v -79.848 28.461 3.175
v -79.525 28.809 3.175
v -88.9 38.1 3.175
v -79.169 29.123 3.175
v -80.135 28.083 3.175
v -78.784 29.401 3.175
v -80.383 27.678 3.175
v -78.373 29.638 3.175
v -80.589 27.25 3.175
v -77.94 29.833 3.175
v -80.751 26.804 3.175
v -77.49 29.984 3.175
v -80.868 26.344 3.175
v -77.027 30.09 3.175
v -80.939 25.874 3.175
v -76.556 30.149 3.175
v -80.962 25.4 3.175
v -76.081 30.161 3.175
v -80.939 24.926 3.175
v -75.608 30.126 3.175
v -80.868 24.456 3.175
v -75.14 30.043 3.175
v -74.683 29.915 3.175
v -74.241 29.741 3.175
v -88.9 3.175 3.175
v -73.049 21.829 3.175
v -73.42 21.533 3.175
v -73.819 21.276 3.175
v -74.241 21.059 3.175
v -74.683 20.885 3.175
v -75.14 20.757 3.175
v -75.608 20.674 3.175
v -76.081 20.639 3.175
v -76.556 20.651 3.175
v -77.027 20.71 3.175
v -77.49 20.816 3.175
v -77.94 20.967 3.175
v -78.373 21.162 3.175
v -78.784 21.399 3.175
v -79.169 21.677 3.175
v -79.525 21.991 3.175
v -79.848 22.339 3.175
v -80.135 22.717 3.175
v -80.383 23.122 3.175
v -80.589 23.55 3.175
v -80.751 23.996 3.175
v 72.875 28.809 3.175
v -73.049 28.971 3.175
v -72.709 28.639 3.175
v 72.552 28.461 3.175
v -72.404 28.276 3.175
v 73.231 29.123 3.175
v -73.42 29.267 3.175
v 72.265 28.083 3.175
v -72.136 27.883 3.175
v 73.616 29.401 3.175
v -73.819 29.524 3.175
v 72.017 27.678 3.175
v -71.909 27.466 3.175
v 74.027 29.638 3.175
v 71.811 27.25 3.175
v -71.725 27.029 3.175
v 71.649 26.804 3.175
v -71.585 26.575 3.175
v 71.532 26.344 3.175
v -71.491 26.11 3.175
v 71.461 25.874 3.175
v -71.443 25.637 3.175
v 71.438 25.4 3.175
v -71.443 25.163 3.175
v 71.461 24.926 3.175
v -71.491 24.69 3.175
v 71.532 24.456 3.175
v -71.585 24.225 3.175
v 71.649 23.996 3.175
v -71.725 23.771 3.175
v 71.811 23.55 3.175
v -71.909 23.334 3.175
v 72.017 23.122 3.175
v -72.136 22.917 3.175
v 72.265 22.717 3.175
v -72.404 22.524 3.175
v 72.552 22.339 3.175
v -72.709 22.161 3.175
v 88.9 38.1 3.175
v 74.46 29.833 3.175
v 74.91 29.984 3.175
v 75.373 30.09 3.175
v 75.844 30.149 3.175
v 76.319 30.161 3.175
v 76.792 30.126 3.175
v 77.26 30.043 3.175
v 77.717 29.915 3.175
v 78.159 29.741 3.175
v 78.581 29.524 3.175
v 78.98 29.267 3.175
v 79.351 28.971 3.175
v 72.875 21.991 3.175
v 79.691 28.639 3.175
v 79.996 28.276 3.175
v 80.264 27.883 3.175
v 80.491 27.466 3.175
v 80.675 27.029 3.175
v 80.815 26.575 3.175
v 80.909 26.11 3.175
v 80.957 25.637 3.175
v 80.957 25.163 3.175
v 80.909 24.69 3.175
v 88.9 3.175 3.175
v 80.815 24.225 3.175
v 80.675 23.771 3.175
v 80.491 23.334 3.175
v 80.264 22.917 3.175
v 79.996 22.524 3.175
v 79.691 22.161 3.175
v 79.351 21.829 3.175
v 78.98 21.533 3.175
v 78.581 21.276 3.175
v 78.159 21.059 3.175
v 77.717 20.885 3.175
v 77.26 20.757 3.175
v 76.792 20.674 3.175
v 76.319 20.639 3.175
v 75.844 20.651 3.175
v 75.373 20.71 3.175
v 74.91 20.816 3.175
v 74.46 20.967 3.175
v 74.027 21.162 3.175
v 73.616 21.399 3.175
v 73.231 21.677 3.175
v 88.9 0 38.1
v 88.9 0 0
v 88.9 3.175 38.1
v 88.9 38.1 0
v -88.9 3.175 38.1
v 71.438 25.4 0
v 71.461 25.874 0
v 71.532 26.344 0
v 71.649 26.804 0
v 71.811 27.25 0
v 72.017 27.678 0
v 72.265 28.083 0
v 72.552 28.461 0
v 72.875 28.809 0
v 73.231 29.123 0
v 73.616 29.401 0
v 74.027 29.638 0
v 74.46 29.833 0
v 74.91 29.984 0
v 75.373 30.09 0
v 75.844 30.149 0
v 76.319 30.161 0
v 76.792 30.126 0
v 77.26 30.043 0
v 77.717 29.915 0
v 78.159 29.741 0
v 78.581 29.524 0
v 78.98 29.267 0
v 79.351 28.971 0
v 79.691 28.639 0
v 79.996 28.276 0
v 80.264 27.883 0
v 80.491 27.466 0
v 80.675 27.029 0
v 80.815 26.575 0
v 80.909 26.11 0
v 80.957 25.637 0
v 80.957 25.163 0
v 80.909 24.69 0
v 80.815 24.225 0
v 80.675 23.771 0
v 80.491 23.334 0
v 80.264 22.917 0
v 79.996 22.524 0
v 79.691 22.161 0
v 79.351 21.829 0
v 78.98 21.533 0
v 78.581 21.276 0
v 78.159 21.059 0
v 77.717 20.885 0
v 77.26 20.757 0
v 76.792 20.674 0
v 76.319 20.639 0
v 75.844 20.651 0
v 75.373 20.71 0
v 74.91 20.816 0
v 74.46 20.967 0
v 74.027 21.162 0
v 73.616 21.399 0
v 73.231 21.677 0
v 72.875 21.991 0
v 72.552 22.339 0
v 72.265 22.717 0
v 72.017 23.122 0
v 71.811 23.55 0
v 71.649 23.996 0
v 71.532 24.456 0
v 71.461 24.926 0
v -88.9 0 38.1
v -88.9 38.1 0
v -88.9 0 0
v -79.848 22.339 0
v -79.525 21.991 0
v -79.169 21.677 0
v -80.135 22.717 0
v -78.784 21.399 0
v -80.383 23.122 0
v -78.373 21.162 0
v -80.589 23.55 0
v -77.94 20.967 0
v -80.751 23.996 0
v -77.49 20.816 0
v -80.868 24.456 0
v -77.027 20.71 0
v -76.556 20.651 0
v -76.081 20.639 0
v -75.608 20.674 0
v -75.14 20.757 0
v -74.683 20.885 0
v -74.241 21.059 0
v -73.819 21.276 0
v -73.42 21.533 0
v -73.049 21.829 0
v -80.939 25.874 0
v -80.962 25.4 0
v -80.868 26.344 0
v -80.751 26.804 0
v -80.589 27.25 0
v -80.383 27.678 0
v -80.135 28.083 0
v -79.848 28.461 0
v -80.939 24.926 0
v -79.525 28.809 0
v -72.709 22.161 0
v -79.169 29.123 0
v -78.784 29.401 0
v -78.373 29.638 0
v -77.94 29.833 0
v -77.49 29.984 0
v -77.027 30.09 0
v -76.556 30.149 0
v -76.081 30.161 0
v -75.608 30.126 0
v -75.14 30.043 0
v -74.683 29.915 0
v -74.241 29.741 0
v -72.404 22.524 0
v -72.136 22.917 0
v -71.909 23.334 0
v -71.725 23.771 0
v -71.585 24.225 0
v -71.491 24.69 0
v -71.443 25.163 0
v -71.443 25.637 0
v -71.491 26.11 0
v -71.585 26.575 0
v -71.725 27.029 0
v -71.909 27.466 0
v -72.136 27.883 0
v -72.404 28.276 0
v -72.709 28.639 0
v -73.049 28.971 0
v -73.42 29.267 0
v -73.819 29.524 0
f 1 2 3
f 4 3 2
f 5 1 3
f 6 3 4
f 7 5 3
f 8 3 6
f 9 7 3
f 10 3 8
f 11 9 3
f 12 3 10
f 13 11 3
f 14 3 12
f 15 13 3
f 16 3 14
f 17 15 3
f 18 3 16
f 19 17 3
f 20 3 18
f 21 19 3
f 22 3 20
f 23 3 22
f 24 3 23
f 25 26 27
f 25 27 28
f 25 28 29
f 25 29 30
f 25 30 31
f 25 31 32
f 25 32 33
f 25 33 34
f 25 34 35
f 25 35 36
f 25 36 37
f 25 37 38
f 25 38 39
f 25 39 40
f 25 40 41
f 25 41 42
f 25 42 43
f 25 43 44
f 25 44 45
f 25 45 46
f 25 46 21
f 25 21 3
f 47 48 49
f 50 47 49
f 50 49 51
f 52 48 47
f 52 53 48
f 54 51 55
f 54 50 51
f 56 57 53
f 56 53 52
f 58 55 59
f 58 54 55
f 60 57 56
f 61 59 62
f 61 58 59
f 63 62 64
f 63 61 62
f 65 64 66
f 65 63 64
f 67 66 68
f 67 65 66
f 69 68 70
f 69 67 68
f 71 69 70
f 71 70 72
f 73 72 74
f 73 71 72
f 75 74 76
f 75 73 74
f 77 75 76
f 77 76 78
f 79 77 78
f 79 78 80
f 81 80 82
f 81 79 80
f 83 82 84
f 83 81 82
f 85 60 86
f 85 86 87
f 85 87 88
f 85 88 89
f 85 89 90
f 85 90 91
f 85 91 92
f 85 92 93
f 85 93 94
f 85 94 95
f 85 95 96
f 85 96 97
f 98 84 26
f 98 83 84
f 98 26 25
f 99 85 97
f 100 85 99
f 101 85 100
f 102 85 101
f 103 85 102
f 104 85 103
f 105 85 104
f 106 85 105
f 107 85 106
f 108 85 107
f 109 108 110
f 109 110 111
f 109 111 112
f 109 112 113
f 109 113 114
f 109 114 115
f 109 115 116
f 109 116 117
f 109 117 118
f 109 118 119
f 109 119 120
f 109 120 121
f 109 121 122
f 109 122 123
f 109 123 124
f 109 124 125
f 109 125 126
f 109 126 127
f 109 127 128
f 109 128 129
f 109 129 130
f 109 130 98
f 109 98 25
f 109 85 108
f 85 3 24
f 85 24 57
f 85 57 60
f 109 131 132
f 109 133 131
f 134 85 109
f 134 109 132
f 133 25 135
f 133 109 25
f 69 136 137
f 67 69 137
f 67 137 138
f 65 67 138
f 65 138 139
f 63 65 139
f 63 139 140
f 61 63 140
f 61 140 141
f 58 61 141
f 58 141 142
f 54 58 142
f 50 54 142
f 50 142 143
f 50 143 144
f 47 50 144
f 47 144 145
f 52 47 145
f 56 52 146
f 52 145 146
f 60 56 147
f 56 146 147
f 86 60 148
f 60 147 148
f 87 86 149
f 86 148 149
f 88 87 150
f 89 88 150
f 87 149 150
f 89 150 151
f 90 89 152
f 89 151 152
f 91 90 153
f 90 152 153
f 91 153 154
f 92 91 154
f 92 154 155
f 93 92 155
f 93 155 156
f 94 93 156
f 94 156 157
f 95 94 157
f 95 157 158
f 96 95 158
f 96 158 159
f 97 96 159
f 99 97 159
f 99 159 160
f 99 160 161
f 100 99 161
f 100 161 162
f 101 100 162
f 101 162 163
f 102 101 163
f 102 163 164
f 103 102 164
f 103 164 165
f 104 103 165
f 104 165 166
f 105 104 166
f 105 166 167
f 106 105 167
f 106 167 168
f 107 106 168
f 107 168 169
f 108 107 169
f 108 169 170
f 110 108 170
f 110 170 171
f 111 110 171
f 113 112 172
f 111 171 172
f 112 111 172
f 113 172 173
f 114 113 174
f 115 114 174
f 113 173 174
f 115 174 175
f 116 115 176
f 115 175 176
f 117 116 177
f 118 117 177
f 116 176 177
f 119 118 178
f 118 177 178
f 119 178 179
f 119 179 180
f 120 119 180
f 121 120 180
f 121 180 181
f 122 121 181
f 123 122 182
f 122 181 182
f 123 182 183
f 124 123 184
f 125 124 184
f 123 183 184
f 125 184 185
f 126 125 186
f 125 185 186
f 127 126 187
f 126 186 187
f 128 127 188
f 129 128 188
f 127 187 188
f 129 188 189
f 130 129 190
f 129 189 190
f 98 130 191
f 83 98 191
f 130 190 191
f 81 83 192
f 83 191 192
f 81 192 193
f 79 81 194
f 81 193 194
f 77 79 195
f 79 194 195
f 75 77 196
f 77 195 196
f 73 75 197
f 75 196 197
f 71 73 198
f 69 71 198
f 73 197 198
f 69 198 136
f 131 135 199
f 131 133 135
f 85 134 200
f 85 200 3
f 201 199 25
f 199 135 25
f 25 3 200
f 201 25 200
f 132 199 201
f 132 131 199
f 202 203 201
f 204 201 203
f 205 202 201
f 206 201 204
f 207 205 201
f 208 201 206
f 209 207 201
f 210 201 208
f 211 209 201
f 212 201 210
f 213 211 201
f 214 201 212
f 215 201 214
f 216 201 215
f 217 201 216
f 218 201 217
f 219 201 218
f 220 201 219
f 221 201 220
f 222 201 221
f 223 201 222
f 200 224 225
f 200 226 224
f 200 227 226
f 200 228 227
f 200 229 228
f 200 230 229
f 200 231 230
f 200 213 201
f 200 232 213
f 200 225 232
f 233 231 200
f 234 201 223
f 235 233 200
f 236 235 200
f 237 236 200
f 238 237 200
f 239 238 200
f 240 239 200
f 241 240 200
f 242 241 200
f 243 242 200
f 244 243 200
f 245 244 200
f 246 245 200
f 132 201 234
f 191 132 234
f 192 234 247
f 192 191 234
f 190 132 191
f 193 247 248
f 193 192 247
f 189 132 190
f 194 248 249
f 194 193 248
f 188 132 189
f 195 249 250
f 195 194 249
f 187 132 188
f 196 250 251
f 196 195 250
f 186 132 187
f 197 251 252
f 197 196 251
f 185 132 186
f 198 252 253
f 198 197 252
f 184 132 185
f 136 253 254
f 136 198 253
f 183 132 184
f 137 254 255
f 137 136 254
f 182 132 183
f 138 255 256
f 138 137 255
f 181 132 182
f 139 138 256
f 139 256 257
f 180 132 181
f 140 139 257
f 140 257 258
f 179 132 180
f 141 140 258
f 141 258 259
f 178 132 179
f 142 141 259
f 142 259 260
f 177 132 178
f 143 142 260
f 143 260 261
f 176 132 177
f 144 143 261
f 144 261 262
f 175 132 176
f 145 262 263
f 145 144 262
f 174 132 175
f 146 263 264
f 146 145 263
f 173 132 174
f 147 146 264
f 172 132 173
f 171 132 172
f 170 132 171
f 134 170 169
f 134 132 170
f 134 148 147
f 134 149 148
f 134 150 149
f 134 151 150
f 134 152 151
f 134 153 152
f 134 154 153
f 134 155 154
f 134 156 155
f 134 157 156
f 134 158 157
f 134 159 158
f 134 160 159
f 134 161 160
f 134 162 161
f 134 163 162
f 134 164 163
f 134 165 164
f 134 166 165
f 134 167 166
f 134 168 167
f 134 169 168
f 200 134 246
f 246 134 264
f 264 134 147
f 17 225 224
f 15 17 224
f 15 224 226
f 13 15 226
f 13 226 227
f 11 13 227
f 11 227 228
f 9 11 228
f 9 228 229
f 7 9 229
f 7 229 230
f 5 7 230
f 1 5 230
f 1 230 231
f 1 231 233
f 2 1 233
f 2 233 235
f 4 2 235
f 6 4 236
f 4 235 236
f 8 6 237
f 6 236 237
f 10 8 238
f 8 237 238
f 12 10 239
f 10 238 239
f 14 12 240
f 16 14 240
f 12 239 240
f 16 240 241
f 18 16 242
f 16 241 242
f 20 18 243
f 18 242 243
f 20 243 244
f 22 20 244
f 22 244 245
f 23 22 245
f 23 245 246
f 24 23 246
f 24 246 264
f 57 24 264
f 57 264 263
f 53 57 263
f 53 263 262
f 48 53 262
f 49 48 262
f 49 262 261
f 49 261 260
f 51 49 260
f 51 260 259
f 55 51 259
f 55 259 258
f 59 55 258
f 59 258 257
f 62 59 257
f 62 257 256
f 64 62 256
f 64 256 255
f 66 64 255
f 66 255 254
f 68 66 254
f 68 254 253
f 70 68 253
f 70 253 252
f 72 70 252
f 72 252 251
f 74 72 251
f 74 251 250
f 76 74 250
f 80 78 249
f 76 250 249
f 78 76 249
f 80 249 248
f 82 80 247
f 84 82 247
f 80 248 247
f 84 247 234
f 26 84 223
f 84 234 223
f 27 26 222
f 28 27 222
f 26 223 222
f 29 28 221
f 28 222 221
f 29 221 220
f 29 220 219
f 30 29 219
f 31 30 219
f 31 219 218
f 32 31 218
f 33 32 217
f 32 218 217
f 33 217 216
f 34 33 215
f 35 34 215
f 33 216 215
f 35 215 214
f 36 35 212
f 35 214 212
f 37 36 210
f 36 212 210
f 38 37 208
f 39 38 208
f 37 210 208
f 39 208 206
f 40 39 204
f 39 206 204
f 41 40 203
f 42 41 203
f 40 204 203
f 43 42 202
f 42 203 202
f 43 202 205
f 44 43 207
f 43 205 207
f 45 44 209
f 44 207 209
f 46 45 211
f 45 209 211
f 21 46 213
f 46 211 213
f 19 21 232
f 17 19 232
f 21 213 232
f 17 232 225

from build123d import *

# Parameters (mm, degrees)
EXTRUDE_THIN1_DEPTH = 88.9
CUT_EXTRUDE1_REACH  = 105.954
SKETCH2_R           = 4.7625


with BuildPart() as part:
    # Sketch1 → Extrude-Thin1 (new, symmetric)
    with BuildSketch(Plane(origin=(0, 0, 0), x_dir=(0, 0, -1), z_dir=(1, 0, 0))):
        Polygon((-38.1, 0), (0, 0), (0, 38.1), (-3.175, 38.1), (-3.175, 3.175), (-38.1, 3.175), align=None)
    extrude(amount=EXTRUDE_THIN1_DEPTH, both=True)

    # Sketch2 → Cut-Extrude1 (cut, up to next)
    with BuildSketch(Plane(origin=(0, 0, 0), x_dir=(-1, 0, 0), z_dir=(0, 0, -1)), mode=Mode.PRIVATE) as cut_extrude1_sk1:
        with Locations((-76.2, 25.4)):
            Circle(SKETCH2_R)
    cut_extrude1_tool1 = extrude(cut_extrude1_sk1.sketch, amount=-CUT_EXTRUDE1_REACH, mode=Mode.PRIVATE) & part.part
    # Sketch2 → Cut-Extrude1 (cut, up to next)
    with BuildSketch(Plane(origin=(0, 0, 0), x_dir=(-1, 0, 0), z_dir=(0, 0, -1)), mode=Mode.PRIVATE) as cut_extrude1_sk2:
        with Locations((76.2, 25.4)):
            Circle(SKETCH2_R)
    cut_extrude1_tool2 = extrude(cut_extrude1_sk2.sketch, amount=-CUT_EXTRUDE1_REACH, mode=Mode.PRIVATE) & part.part
    add(cut_extrude1_tool1.solids().sort_by_distance((76.2, 25.4, 0))[0], mode=Mode.SUBTRACT)
    add(cut_extrude1_tool2.solids().sort_by_distance((-76.2, 25.4, 0))[0], mode=Mode.SUBTRACT)


solid = part.part
